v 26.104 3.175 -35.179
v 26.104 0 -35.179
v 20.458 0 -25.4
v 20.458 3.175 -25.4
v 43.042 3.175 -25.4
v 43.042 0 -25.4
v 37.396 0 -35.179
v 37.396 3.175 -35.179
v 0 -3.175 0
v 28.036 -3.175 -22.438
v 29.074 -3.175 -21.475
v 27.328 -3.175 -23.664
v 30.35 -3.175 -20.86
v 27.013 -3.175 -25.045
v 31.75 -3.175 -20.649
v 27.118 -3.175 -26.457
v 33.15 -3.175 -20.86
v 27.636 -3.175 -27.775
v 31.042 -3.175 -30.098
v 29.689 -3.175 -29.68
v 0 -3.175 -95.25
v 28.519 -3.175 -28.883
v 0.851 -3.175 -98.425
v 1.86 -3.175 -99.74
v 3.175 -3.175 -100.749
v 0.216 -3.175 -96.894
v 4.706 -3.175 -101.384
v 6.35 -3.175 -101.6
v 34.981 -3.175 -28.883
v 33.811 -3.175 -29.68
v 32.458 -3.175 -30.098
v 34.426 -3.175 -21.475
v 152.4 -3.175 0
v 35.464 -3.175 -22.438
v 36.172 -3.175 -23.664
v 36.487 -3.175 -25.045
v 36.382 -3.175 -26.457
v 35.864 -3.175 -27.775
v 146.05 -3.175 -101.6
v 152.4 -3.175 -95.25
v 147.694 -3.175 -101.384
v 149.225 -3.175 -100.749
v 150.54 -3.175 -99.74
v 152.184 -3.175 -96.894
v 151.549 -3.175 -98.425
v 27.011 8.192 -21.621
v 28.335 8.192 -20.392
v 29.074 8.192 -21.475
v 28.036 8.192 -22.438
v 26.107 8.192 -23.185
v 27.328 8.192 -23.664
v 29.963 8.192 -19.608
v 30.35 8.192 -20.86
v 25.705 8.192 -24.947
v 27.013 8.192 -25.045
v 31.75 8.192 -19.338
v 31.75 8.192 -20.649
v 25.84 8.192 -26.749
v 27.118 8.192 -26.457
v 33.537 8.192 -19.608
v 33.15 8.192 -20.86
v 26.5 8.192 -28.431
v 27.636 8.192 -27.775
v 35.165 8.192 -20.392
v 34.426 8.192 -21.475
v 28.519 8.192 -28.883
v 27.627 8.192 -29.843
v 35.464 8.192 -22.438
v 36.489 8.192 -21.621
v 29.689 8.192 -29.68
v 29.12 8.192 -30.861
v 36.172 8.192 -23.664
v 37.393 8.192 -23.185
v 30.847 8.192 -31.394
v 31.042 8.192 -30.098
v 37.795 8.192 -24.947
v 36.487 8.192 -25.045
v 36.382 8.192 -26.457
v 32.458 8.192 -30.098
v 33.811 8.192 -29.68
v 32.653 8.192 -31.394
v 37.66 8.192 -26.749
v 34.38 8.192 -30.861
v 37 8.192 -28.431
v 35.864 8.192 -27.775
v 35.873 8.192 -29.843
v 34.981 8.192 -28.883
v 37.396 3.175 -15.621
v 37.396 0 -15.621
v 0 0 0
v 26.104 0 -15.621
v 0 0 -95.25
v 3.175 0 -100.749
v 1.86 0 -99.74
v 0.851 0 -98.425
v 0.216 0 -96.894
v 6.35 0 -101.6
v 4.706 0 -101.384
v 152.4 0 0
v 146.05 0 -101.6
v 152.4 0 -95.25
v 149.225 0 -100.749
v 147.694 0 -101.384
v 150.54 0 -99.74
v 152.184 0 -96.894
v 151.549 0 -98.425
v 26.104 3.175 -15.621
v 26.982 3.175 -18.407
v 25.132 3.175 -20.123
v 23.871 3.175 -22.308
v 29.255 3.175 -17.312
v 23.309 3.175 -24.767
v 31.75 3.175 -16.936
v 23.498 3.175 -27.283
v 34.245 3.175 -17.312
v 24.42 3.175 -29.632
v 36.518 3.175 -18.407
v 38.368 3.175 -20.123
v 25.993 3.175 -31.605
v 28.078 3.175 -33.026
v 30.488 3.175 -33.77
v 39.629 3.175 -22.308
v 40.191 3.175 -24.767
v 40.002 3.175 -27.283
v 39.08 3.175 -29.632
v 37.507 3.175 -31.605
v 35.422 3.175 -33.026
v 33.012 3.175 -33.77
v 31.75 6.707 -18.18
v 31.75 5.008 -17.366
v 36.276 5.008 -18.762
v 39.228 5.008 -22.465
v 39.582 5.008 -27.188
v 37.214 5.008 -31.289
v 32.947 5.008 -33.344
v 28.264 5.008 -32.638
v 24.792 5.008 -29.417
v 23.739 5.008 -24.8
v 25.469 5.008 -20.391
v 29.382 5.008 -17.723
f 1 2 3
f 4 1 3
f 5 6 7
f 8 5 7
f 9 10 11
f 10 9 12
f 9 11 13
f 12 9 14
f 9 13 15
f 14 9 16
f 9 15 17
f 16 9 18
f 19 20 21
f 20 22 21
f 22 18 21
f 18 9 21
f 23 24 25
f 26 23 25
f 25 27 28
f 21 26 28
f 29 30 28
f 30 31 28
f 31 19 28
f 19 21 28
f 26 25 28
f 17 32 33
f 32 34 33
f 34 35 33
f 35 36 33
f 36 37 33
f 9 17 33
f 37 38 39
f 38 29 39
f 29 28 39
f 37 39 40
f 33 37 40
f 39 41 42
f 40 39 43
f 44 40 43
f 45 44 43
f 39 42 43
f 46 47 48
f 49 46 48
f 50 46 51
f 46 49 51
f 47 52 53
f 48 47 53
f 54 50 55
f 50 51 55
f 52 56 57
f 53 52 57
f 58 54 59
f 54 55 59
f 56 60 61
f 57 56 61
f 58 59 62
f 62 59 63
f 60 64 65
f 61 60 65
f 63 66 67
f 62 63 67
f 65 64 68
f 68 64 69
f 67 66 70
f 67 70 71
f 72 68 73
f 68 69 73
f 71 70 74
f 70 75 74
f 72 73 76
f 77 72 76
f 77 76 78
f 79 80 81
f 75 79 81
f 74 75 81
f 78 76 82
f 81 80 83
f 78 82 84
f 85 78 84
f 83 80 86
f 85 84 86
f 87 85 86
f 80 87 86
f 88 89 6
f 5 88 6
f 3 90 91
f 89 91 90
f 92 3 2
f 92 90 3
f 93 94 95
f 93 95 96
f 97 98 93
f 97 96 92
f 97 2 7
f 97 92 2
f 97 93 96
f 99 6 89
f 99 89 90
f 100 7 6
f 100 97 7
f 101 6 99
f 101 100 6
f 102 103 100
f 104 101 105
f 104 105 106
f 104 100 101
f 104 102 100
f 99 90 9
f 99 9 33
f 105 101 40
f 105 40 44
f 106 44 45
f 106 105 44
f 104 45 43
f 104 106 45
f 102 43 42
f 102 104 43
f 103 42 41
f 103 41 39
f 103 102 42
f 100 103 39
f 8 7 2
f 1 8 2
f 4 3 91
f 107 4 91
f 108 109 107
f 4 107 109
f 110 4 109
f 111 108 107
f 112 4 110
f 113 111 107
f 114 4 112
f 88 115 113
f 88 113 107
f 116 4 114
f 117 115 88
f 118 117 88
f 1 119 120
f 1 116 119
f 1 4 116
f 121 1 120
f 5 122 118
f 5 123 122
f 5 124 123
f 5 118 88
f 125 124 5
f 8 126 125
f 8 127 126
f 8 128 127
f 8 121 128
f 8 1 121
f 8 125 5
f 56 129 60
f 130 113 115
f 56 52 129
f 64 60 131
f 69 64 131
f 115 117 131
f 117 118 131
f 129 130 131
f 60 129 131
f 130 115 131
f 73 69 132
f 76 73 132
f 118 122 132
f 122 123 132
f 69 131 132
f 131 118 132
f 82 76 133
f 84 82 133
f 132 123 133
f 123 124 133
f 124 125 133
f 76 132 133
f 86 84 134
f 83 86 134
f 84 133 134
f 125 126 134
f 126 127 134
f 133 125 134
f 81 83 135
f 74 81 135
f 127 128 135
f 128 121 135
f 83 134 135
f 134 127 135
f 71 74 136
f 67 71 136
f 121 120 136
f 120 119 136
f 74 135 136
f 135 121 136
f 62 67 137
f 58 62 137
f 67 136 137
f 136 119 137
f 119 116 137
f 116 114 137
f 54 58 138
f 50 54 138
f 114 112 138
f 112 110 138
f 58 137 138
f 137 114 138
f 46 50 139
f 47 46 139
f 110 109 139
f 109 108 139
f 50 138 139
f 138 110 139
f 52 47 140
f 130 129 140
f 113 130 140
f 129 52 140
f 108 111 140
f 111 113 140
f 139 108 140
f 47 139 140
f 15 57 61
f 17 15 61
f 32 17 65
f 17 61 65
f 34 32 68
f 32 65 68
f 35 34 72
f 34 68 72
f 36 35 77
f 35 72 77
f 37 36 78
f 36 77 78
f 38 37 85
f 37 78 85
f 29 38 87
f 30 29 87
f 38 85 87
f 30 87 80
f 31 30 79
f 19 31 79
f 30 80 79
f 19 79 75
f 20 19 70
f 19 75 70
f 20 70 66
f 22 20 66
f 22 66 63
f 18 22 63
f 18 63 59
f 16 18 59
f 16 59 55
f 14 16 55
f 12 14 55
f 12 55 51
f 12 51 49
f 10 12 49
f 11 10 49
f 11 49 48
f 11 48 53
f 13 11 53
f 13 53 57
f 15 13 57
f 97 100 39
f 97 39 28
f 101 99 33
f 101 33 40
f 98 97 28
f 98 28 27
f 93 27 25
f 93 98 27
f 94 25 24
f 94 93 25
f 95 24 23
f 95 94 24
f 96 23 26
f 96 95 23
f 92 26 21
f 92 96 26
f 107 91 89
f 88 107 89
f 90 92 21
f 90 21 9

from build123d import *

# Parameters (mm, degrees)
EXTRUDE1_DEPTH = 3.175
EXTRUDE2_DEPTH = 3.175
SKETCH4_R      = 4.750719405
EXTRUDE3_DEPTH = 184.514359856


with BuildPart() as part:
    # Sketch1 → Extrude1 (new body)
    with BuildSketch(Plane(origin=(0, 0, 0), x_dir=(1, 0, 0), z_dir=(0, 1, 0))):
        with BuildLine():
            Line((0, 0), (152.4, 0))
            Line((152.4, 0), (152.4, 95.25))
            ThreePointArc((152.4, 95.25), (150.540128061, 99.740128061), (146.05, 101.6))
            Line((146.05, 101.6), (6.35, 101.6))
            ThreePointArc((6.35, 101.6), (1.859871939, 99.740128061), (0, 95.25))
            Line((0, 95.25), (0, 0))
        make_face()
    extrude(amount=-EXTRUDE1_DEPTH)

    # Sketch2 → Extrude2 (add)
    with BuildSketch(Plane(origin=(0, 0, 0), x_dir=(1, 0, 0), z_dir=(0, 1, 0))):
        Polygon((43.041816565, 25.4), (37.395908282, 35.179), (26.104091718, 35.179), (20.458183435, 25.4), (26.104091718, 15.621), (37.395908282, 15.621), align=None)
    extrude(amount=EXTRUDE2_DEPTH)

    # Sketch3 → Revolve1 (revolve)
    with BuildSketch(Plane.XY.offset(-25.4), mode=Mode.PRIVATE) as revolve1_sk:
        with BuildLine():
            Line((31.75, 8.191629817), (37.811630026, 8.191629817))
            ThreePointArc((37.811630026, 8.191629817), (39.423025401, 5.879728861), (40.214178276, 3.175))
            Line((40.214178276, 3.175), (31.75, 3.175))
            Line((31.75, 3.175), (31.75, 8.191629817))
        make_face()
    revolve(revolve1_sk.sketch.rotate(Axis((31.75, 3.175, -25.4), (0, 1, 0)), 270), axis=Axis((31.75, 3.175, -25.4), (0, 1, 0)))

    # Sketch4 → Extrude3 (cut, through all)
    with BuildSketch(Plane(origin=(0, 8.191629817, 0), x_dir=(-1, 0, 0), z_dir=(0, 1, 0))):
        with Locations(Location((-31.75, -25.4, 0), (0, 0, 90))):
            Circle(SKETCH4_R)
    extrude(amount=-EXTRUDE3_DEPTH, mode=Mode.SUBTRACT)


solid = part.part
